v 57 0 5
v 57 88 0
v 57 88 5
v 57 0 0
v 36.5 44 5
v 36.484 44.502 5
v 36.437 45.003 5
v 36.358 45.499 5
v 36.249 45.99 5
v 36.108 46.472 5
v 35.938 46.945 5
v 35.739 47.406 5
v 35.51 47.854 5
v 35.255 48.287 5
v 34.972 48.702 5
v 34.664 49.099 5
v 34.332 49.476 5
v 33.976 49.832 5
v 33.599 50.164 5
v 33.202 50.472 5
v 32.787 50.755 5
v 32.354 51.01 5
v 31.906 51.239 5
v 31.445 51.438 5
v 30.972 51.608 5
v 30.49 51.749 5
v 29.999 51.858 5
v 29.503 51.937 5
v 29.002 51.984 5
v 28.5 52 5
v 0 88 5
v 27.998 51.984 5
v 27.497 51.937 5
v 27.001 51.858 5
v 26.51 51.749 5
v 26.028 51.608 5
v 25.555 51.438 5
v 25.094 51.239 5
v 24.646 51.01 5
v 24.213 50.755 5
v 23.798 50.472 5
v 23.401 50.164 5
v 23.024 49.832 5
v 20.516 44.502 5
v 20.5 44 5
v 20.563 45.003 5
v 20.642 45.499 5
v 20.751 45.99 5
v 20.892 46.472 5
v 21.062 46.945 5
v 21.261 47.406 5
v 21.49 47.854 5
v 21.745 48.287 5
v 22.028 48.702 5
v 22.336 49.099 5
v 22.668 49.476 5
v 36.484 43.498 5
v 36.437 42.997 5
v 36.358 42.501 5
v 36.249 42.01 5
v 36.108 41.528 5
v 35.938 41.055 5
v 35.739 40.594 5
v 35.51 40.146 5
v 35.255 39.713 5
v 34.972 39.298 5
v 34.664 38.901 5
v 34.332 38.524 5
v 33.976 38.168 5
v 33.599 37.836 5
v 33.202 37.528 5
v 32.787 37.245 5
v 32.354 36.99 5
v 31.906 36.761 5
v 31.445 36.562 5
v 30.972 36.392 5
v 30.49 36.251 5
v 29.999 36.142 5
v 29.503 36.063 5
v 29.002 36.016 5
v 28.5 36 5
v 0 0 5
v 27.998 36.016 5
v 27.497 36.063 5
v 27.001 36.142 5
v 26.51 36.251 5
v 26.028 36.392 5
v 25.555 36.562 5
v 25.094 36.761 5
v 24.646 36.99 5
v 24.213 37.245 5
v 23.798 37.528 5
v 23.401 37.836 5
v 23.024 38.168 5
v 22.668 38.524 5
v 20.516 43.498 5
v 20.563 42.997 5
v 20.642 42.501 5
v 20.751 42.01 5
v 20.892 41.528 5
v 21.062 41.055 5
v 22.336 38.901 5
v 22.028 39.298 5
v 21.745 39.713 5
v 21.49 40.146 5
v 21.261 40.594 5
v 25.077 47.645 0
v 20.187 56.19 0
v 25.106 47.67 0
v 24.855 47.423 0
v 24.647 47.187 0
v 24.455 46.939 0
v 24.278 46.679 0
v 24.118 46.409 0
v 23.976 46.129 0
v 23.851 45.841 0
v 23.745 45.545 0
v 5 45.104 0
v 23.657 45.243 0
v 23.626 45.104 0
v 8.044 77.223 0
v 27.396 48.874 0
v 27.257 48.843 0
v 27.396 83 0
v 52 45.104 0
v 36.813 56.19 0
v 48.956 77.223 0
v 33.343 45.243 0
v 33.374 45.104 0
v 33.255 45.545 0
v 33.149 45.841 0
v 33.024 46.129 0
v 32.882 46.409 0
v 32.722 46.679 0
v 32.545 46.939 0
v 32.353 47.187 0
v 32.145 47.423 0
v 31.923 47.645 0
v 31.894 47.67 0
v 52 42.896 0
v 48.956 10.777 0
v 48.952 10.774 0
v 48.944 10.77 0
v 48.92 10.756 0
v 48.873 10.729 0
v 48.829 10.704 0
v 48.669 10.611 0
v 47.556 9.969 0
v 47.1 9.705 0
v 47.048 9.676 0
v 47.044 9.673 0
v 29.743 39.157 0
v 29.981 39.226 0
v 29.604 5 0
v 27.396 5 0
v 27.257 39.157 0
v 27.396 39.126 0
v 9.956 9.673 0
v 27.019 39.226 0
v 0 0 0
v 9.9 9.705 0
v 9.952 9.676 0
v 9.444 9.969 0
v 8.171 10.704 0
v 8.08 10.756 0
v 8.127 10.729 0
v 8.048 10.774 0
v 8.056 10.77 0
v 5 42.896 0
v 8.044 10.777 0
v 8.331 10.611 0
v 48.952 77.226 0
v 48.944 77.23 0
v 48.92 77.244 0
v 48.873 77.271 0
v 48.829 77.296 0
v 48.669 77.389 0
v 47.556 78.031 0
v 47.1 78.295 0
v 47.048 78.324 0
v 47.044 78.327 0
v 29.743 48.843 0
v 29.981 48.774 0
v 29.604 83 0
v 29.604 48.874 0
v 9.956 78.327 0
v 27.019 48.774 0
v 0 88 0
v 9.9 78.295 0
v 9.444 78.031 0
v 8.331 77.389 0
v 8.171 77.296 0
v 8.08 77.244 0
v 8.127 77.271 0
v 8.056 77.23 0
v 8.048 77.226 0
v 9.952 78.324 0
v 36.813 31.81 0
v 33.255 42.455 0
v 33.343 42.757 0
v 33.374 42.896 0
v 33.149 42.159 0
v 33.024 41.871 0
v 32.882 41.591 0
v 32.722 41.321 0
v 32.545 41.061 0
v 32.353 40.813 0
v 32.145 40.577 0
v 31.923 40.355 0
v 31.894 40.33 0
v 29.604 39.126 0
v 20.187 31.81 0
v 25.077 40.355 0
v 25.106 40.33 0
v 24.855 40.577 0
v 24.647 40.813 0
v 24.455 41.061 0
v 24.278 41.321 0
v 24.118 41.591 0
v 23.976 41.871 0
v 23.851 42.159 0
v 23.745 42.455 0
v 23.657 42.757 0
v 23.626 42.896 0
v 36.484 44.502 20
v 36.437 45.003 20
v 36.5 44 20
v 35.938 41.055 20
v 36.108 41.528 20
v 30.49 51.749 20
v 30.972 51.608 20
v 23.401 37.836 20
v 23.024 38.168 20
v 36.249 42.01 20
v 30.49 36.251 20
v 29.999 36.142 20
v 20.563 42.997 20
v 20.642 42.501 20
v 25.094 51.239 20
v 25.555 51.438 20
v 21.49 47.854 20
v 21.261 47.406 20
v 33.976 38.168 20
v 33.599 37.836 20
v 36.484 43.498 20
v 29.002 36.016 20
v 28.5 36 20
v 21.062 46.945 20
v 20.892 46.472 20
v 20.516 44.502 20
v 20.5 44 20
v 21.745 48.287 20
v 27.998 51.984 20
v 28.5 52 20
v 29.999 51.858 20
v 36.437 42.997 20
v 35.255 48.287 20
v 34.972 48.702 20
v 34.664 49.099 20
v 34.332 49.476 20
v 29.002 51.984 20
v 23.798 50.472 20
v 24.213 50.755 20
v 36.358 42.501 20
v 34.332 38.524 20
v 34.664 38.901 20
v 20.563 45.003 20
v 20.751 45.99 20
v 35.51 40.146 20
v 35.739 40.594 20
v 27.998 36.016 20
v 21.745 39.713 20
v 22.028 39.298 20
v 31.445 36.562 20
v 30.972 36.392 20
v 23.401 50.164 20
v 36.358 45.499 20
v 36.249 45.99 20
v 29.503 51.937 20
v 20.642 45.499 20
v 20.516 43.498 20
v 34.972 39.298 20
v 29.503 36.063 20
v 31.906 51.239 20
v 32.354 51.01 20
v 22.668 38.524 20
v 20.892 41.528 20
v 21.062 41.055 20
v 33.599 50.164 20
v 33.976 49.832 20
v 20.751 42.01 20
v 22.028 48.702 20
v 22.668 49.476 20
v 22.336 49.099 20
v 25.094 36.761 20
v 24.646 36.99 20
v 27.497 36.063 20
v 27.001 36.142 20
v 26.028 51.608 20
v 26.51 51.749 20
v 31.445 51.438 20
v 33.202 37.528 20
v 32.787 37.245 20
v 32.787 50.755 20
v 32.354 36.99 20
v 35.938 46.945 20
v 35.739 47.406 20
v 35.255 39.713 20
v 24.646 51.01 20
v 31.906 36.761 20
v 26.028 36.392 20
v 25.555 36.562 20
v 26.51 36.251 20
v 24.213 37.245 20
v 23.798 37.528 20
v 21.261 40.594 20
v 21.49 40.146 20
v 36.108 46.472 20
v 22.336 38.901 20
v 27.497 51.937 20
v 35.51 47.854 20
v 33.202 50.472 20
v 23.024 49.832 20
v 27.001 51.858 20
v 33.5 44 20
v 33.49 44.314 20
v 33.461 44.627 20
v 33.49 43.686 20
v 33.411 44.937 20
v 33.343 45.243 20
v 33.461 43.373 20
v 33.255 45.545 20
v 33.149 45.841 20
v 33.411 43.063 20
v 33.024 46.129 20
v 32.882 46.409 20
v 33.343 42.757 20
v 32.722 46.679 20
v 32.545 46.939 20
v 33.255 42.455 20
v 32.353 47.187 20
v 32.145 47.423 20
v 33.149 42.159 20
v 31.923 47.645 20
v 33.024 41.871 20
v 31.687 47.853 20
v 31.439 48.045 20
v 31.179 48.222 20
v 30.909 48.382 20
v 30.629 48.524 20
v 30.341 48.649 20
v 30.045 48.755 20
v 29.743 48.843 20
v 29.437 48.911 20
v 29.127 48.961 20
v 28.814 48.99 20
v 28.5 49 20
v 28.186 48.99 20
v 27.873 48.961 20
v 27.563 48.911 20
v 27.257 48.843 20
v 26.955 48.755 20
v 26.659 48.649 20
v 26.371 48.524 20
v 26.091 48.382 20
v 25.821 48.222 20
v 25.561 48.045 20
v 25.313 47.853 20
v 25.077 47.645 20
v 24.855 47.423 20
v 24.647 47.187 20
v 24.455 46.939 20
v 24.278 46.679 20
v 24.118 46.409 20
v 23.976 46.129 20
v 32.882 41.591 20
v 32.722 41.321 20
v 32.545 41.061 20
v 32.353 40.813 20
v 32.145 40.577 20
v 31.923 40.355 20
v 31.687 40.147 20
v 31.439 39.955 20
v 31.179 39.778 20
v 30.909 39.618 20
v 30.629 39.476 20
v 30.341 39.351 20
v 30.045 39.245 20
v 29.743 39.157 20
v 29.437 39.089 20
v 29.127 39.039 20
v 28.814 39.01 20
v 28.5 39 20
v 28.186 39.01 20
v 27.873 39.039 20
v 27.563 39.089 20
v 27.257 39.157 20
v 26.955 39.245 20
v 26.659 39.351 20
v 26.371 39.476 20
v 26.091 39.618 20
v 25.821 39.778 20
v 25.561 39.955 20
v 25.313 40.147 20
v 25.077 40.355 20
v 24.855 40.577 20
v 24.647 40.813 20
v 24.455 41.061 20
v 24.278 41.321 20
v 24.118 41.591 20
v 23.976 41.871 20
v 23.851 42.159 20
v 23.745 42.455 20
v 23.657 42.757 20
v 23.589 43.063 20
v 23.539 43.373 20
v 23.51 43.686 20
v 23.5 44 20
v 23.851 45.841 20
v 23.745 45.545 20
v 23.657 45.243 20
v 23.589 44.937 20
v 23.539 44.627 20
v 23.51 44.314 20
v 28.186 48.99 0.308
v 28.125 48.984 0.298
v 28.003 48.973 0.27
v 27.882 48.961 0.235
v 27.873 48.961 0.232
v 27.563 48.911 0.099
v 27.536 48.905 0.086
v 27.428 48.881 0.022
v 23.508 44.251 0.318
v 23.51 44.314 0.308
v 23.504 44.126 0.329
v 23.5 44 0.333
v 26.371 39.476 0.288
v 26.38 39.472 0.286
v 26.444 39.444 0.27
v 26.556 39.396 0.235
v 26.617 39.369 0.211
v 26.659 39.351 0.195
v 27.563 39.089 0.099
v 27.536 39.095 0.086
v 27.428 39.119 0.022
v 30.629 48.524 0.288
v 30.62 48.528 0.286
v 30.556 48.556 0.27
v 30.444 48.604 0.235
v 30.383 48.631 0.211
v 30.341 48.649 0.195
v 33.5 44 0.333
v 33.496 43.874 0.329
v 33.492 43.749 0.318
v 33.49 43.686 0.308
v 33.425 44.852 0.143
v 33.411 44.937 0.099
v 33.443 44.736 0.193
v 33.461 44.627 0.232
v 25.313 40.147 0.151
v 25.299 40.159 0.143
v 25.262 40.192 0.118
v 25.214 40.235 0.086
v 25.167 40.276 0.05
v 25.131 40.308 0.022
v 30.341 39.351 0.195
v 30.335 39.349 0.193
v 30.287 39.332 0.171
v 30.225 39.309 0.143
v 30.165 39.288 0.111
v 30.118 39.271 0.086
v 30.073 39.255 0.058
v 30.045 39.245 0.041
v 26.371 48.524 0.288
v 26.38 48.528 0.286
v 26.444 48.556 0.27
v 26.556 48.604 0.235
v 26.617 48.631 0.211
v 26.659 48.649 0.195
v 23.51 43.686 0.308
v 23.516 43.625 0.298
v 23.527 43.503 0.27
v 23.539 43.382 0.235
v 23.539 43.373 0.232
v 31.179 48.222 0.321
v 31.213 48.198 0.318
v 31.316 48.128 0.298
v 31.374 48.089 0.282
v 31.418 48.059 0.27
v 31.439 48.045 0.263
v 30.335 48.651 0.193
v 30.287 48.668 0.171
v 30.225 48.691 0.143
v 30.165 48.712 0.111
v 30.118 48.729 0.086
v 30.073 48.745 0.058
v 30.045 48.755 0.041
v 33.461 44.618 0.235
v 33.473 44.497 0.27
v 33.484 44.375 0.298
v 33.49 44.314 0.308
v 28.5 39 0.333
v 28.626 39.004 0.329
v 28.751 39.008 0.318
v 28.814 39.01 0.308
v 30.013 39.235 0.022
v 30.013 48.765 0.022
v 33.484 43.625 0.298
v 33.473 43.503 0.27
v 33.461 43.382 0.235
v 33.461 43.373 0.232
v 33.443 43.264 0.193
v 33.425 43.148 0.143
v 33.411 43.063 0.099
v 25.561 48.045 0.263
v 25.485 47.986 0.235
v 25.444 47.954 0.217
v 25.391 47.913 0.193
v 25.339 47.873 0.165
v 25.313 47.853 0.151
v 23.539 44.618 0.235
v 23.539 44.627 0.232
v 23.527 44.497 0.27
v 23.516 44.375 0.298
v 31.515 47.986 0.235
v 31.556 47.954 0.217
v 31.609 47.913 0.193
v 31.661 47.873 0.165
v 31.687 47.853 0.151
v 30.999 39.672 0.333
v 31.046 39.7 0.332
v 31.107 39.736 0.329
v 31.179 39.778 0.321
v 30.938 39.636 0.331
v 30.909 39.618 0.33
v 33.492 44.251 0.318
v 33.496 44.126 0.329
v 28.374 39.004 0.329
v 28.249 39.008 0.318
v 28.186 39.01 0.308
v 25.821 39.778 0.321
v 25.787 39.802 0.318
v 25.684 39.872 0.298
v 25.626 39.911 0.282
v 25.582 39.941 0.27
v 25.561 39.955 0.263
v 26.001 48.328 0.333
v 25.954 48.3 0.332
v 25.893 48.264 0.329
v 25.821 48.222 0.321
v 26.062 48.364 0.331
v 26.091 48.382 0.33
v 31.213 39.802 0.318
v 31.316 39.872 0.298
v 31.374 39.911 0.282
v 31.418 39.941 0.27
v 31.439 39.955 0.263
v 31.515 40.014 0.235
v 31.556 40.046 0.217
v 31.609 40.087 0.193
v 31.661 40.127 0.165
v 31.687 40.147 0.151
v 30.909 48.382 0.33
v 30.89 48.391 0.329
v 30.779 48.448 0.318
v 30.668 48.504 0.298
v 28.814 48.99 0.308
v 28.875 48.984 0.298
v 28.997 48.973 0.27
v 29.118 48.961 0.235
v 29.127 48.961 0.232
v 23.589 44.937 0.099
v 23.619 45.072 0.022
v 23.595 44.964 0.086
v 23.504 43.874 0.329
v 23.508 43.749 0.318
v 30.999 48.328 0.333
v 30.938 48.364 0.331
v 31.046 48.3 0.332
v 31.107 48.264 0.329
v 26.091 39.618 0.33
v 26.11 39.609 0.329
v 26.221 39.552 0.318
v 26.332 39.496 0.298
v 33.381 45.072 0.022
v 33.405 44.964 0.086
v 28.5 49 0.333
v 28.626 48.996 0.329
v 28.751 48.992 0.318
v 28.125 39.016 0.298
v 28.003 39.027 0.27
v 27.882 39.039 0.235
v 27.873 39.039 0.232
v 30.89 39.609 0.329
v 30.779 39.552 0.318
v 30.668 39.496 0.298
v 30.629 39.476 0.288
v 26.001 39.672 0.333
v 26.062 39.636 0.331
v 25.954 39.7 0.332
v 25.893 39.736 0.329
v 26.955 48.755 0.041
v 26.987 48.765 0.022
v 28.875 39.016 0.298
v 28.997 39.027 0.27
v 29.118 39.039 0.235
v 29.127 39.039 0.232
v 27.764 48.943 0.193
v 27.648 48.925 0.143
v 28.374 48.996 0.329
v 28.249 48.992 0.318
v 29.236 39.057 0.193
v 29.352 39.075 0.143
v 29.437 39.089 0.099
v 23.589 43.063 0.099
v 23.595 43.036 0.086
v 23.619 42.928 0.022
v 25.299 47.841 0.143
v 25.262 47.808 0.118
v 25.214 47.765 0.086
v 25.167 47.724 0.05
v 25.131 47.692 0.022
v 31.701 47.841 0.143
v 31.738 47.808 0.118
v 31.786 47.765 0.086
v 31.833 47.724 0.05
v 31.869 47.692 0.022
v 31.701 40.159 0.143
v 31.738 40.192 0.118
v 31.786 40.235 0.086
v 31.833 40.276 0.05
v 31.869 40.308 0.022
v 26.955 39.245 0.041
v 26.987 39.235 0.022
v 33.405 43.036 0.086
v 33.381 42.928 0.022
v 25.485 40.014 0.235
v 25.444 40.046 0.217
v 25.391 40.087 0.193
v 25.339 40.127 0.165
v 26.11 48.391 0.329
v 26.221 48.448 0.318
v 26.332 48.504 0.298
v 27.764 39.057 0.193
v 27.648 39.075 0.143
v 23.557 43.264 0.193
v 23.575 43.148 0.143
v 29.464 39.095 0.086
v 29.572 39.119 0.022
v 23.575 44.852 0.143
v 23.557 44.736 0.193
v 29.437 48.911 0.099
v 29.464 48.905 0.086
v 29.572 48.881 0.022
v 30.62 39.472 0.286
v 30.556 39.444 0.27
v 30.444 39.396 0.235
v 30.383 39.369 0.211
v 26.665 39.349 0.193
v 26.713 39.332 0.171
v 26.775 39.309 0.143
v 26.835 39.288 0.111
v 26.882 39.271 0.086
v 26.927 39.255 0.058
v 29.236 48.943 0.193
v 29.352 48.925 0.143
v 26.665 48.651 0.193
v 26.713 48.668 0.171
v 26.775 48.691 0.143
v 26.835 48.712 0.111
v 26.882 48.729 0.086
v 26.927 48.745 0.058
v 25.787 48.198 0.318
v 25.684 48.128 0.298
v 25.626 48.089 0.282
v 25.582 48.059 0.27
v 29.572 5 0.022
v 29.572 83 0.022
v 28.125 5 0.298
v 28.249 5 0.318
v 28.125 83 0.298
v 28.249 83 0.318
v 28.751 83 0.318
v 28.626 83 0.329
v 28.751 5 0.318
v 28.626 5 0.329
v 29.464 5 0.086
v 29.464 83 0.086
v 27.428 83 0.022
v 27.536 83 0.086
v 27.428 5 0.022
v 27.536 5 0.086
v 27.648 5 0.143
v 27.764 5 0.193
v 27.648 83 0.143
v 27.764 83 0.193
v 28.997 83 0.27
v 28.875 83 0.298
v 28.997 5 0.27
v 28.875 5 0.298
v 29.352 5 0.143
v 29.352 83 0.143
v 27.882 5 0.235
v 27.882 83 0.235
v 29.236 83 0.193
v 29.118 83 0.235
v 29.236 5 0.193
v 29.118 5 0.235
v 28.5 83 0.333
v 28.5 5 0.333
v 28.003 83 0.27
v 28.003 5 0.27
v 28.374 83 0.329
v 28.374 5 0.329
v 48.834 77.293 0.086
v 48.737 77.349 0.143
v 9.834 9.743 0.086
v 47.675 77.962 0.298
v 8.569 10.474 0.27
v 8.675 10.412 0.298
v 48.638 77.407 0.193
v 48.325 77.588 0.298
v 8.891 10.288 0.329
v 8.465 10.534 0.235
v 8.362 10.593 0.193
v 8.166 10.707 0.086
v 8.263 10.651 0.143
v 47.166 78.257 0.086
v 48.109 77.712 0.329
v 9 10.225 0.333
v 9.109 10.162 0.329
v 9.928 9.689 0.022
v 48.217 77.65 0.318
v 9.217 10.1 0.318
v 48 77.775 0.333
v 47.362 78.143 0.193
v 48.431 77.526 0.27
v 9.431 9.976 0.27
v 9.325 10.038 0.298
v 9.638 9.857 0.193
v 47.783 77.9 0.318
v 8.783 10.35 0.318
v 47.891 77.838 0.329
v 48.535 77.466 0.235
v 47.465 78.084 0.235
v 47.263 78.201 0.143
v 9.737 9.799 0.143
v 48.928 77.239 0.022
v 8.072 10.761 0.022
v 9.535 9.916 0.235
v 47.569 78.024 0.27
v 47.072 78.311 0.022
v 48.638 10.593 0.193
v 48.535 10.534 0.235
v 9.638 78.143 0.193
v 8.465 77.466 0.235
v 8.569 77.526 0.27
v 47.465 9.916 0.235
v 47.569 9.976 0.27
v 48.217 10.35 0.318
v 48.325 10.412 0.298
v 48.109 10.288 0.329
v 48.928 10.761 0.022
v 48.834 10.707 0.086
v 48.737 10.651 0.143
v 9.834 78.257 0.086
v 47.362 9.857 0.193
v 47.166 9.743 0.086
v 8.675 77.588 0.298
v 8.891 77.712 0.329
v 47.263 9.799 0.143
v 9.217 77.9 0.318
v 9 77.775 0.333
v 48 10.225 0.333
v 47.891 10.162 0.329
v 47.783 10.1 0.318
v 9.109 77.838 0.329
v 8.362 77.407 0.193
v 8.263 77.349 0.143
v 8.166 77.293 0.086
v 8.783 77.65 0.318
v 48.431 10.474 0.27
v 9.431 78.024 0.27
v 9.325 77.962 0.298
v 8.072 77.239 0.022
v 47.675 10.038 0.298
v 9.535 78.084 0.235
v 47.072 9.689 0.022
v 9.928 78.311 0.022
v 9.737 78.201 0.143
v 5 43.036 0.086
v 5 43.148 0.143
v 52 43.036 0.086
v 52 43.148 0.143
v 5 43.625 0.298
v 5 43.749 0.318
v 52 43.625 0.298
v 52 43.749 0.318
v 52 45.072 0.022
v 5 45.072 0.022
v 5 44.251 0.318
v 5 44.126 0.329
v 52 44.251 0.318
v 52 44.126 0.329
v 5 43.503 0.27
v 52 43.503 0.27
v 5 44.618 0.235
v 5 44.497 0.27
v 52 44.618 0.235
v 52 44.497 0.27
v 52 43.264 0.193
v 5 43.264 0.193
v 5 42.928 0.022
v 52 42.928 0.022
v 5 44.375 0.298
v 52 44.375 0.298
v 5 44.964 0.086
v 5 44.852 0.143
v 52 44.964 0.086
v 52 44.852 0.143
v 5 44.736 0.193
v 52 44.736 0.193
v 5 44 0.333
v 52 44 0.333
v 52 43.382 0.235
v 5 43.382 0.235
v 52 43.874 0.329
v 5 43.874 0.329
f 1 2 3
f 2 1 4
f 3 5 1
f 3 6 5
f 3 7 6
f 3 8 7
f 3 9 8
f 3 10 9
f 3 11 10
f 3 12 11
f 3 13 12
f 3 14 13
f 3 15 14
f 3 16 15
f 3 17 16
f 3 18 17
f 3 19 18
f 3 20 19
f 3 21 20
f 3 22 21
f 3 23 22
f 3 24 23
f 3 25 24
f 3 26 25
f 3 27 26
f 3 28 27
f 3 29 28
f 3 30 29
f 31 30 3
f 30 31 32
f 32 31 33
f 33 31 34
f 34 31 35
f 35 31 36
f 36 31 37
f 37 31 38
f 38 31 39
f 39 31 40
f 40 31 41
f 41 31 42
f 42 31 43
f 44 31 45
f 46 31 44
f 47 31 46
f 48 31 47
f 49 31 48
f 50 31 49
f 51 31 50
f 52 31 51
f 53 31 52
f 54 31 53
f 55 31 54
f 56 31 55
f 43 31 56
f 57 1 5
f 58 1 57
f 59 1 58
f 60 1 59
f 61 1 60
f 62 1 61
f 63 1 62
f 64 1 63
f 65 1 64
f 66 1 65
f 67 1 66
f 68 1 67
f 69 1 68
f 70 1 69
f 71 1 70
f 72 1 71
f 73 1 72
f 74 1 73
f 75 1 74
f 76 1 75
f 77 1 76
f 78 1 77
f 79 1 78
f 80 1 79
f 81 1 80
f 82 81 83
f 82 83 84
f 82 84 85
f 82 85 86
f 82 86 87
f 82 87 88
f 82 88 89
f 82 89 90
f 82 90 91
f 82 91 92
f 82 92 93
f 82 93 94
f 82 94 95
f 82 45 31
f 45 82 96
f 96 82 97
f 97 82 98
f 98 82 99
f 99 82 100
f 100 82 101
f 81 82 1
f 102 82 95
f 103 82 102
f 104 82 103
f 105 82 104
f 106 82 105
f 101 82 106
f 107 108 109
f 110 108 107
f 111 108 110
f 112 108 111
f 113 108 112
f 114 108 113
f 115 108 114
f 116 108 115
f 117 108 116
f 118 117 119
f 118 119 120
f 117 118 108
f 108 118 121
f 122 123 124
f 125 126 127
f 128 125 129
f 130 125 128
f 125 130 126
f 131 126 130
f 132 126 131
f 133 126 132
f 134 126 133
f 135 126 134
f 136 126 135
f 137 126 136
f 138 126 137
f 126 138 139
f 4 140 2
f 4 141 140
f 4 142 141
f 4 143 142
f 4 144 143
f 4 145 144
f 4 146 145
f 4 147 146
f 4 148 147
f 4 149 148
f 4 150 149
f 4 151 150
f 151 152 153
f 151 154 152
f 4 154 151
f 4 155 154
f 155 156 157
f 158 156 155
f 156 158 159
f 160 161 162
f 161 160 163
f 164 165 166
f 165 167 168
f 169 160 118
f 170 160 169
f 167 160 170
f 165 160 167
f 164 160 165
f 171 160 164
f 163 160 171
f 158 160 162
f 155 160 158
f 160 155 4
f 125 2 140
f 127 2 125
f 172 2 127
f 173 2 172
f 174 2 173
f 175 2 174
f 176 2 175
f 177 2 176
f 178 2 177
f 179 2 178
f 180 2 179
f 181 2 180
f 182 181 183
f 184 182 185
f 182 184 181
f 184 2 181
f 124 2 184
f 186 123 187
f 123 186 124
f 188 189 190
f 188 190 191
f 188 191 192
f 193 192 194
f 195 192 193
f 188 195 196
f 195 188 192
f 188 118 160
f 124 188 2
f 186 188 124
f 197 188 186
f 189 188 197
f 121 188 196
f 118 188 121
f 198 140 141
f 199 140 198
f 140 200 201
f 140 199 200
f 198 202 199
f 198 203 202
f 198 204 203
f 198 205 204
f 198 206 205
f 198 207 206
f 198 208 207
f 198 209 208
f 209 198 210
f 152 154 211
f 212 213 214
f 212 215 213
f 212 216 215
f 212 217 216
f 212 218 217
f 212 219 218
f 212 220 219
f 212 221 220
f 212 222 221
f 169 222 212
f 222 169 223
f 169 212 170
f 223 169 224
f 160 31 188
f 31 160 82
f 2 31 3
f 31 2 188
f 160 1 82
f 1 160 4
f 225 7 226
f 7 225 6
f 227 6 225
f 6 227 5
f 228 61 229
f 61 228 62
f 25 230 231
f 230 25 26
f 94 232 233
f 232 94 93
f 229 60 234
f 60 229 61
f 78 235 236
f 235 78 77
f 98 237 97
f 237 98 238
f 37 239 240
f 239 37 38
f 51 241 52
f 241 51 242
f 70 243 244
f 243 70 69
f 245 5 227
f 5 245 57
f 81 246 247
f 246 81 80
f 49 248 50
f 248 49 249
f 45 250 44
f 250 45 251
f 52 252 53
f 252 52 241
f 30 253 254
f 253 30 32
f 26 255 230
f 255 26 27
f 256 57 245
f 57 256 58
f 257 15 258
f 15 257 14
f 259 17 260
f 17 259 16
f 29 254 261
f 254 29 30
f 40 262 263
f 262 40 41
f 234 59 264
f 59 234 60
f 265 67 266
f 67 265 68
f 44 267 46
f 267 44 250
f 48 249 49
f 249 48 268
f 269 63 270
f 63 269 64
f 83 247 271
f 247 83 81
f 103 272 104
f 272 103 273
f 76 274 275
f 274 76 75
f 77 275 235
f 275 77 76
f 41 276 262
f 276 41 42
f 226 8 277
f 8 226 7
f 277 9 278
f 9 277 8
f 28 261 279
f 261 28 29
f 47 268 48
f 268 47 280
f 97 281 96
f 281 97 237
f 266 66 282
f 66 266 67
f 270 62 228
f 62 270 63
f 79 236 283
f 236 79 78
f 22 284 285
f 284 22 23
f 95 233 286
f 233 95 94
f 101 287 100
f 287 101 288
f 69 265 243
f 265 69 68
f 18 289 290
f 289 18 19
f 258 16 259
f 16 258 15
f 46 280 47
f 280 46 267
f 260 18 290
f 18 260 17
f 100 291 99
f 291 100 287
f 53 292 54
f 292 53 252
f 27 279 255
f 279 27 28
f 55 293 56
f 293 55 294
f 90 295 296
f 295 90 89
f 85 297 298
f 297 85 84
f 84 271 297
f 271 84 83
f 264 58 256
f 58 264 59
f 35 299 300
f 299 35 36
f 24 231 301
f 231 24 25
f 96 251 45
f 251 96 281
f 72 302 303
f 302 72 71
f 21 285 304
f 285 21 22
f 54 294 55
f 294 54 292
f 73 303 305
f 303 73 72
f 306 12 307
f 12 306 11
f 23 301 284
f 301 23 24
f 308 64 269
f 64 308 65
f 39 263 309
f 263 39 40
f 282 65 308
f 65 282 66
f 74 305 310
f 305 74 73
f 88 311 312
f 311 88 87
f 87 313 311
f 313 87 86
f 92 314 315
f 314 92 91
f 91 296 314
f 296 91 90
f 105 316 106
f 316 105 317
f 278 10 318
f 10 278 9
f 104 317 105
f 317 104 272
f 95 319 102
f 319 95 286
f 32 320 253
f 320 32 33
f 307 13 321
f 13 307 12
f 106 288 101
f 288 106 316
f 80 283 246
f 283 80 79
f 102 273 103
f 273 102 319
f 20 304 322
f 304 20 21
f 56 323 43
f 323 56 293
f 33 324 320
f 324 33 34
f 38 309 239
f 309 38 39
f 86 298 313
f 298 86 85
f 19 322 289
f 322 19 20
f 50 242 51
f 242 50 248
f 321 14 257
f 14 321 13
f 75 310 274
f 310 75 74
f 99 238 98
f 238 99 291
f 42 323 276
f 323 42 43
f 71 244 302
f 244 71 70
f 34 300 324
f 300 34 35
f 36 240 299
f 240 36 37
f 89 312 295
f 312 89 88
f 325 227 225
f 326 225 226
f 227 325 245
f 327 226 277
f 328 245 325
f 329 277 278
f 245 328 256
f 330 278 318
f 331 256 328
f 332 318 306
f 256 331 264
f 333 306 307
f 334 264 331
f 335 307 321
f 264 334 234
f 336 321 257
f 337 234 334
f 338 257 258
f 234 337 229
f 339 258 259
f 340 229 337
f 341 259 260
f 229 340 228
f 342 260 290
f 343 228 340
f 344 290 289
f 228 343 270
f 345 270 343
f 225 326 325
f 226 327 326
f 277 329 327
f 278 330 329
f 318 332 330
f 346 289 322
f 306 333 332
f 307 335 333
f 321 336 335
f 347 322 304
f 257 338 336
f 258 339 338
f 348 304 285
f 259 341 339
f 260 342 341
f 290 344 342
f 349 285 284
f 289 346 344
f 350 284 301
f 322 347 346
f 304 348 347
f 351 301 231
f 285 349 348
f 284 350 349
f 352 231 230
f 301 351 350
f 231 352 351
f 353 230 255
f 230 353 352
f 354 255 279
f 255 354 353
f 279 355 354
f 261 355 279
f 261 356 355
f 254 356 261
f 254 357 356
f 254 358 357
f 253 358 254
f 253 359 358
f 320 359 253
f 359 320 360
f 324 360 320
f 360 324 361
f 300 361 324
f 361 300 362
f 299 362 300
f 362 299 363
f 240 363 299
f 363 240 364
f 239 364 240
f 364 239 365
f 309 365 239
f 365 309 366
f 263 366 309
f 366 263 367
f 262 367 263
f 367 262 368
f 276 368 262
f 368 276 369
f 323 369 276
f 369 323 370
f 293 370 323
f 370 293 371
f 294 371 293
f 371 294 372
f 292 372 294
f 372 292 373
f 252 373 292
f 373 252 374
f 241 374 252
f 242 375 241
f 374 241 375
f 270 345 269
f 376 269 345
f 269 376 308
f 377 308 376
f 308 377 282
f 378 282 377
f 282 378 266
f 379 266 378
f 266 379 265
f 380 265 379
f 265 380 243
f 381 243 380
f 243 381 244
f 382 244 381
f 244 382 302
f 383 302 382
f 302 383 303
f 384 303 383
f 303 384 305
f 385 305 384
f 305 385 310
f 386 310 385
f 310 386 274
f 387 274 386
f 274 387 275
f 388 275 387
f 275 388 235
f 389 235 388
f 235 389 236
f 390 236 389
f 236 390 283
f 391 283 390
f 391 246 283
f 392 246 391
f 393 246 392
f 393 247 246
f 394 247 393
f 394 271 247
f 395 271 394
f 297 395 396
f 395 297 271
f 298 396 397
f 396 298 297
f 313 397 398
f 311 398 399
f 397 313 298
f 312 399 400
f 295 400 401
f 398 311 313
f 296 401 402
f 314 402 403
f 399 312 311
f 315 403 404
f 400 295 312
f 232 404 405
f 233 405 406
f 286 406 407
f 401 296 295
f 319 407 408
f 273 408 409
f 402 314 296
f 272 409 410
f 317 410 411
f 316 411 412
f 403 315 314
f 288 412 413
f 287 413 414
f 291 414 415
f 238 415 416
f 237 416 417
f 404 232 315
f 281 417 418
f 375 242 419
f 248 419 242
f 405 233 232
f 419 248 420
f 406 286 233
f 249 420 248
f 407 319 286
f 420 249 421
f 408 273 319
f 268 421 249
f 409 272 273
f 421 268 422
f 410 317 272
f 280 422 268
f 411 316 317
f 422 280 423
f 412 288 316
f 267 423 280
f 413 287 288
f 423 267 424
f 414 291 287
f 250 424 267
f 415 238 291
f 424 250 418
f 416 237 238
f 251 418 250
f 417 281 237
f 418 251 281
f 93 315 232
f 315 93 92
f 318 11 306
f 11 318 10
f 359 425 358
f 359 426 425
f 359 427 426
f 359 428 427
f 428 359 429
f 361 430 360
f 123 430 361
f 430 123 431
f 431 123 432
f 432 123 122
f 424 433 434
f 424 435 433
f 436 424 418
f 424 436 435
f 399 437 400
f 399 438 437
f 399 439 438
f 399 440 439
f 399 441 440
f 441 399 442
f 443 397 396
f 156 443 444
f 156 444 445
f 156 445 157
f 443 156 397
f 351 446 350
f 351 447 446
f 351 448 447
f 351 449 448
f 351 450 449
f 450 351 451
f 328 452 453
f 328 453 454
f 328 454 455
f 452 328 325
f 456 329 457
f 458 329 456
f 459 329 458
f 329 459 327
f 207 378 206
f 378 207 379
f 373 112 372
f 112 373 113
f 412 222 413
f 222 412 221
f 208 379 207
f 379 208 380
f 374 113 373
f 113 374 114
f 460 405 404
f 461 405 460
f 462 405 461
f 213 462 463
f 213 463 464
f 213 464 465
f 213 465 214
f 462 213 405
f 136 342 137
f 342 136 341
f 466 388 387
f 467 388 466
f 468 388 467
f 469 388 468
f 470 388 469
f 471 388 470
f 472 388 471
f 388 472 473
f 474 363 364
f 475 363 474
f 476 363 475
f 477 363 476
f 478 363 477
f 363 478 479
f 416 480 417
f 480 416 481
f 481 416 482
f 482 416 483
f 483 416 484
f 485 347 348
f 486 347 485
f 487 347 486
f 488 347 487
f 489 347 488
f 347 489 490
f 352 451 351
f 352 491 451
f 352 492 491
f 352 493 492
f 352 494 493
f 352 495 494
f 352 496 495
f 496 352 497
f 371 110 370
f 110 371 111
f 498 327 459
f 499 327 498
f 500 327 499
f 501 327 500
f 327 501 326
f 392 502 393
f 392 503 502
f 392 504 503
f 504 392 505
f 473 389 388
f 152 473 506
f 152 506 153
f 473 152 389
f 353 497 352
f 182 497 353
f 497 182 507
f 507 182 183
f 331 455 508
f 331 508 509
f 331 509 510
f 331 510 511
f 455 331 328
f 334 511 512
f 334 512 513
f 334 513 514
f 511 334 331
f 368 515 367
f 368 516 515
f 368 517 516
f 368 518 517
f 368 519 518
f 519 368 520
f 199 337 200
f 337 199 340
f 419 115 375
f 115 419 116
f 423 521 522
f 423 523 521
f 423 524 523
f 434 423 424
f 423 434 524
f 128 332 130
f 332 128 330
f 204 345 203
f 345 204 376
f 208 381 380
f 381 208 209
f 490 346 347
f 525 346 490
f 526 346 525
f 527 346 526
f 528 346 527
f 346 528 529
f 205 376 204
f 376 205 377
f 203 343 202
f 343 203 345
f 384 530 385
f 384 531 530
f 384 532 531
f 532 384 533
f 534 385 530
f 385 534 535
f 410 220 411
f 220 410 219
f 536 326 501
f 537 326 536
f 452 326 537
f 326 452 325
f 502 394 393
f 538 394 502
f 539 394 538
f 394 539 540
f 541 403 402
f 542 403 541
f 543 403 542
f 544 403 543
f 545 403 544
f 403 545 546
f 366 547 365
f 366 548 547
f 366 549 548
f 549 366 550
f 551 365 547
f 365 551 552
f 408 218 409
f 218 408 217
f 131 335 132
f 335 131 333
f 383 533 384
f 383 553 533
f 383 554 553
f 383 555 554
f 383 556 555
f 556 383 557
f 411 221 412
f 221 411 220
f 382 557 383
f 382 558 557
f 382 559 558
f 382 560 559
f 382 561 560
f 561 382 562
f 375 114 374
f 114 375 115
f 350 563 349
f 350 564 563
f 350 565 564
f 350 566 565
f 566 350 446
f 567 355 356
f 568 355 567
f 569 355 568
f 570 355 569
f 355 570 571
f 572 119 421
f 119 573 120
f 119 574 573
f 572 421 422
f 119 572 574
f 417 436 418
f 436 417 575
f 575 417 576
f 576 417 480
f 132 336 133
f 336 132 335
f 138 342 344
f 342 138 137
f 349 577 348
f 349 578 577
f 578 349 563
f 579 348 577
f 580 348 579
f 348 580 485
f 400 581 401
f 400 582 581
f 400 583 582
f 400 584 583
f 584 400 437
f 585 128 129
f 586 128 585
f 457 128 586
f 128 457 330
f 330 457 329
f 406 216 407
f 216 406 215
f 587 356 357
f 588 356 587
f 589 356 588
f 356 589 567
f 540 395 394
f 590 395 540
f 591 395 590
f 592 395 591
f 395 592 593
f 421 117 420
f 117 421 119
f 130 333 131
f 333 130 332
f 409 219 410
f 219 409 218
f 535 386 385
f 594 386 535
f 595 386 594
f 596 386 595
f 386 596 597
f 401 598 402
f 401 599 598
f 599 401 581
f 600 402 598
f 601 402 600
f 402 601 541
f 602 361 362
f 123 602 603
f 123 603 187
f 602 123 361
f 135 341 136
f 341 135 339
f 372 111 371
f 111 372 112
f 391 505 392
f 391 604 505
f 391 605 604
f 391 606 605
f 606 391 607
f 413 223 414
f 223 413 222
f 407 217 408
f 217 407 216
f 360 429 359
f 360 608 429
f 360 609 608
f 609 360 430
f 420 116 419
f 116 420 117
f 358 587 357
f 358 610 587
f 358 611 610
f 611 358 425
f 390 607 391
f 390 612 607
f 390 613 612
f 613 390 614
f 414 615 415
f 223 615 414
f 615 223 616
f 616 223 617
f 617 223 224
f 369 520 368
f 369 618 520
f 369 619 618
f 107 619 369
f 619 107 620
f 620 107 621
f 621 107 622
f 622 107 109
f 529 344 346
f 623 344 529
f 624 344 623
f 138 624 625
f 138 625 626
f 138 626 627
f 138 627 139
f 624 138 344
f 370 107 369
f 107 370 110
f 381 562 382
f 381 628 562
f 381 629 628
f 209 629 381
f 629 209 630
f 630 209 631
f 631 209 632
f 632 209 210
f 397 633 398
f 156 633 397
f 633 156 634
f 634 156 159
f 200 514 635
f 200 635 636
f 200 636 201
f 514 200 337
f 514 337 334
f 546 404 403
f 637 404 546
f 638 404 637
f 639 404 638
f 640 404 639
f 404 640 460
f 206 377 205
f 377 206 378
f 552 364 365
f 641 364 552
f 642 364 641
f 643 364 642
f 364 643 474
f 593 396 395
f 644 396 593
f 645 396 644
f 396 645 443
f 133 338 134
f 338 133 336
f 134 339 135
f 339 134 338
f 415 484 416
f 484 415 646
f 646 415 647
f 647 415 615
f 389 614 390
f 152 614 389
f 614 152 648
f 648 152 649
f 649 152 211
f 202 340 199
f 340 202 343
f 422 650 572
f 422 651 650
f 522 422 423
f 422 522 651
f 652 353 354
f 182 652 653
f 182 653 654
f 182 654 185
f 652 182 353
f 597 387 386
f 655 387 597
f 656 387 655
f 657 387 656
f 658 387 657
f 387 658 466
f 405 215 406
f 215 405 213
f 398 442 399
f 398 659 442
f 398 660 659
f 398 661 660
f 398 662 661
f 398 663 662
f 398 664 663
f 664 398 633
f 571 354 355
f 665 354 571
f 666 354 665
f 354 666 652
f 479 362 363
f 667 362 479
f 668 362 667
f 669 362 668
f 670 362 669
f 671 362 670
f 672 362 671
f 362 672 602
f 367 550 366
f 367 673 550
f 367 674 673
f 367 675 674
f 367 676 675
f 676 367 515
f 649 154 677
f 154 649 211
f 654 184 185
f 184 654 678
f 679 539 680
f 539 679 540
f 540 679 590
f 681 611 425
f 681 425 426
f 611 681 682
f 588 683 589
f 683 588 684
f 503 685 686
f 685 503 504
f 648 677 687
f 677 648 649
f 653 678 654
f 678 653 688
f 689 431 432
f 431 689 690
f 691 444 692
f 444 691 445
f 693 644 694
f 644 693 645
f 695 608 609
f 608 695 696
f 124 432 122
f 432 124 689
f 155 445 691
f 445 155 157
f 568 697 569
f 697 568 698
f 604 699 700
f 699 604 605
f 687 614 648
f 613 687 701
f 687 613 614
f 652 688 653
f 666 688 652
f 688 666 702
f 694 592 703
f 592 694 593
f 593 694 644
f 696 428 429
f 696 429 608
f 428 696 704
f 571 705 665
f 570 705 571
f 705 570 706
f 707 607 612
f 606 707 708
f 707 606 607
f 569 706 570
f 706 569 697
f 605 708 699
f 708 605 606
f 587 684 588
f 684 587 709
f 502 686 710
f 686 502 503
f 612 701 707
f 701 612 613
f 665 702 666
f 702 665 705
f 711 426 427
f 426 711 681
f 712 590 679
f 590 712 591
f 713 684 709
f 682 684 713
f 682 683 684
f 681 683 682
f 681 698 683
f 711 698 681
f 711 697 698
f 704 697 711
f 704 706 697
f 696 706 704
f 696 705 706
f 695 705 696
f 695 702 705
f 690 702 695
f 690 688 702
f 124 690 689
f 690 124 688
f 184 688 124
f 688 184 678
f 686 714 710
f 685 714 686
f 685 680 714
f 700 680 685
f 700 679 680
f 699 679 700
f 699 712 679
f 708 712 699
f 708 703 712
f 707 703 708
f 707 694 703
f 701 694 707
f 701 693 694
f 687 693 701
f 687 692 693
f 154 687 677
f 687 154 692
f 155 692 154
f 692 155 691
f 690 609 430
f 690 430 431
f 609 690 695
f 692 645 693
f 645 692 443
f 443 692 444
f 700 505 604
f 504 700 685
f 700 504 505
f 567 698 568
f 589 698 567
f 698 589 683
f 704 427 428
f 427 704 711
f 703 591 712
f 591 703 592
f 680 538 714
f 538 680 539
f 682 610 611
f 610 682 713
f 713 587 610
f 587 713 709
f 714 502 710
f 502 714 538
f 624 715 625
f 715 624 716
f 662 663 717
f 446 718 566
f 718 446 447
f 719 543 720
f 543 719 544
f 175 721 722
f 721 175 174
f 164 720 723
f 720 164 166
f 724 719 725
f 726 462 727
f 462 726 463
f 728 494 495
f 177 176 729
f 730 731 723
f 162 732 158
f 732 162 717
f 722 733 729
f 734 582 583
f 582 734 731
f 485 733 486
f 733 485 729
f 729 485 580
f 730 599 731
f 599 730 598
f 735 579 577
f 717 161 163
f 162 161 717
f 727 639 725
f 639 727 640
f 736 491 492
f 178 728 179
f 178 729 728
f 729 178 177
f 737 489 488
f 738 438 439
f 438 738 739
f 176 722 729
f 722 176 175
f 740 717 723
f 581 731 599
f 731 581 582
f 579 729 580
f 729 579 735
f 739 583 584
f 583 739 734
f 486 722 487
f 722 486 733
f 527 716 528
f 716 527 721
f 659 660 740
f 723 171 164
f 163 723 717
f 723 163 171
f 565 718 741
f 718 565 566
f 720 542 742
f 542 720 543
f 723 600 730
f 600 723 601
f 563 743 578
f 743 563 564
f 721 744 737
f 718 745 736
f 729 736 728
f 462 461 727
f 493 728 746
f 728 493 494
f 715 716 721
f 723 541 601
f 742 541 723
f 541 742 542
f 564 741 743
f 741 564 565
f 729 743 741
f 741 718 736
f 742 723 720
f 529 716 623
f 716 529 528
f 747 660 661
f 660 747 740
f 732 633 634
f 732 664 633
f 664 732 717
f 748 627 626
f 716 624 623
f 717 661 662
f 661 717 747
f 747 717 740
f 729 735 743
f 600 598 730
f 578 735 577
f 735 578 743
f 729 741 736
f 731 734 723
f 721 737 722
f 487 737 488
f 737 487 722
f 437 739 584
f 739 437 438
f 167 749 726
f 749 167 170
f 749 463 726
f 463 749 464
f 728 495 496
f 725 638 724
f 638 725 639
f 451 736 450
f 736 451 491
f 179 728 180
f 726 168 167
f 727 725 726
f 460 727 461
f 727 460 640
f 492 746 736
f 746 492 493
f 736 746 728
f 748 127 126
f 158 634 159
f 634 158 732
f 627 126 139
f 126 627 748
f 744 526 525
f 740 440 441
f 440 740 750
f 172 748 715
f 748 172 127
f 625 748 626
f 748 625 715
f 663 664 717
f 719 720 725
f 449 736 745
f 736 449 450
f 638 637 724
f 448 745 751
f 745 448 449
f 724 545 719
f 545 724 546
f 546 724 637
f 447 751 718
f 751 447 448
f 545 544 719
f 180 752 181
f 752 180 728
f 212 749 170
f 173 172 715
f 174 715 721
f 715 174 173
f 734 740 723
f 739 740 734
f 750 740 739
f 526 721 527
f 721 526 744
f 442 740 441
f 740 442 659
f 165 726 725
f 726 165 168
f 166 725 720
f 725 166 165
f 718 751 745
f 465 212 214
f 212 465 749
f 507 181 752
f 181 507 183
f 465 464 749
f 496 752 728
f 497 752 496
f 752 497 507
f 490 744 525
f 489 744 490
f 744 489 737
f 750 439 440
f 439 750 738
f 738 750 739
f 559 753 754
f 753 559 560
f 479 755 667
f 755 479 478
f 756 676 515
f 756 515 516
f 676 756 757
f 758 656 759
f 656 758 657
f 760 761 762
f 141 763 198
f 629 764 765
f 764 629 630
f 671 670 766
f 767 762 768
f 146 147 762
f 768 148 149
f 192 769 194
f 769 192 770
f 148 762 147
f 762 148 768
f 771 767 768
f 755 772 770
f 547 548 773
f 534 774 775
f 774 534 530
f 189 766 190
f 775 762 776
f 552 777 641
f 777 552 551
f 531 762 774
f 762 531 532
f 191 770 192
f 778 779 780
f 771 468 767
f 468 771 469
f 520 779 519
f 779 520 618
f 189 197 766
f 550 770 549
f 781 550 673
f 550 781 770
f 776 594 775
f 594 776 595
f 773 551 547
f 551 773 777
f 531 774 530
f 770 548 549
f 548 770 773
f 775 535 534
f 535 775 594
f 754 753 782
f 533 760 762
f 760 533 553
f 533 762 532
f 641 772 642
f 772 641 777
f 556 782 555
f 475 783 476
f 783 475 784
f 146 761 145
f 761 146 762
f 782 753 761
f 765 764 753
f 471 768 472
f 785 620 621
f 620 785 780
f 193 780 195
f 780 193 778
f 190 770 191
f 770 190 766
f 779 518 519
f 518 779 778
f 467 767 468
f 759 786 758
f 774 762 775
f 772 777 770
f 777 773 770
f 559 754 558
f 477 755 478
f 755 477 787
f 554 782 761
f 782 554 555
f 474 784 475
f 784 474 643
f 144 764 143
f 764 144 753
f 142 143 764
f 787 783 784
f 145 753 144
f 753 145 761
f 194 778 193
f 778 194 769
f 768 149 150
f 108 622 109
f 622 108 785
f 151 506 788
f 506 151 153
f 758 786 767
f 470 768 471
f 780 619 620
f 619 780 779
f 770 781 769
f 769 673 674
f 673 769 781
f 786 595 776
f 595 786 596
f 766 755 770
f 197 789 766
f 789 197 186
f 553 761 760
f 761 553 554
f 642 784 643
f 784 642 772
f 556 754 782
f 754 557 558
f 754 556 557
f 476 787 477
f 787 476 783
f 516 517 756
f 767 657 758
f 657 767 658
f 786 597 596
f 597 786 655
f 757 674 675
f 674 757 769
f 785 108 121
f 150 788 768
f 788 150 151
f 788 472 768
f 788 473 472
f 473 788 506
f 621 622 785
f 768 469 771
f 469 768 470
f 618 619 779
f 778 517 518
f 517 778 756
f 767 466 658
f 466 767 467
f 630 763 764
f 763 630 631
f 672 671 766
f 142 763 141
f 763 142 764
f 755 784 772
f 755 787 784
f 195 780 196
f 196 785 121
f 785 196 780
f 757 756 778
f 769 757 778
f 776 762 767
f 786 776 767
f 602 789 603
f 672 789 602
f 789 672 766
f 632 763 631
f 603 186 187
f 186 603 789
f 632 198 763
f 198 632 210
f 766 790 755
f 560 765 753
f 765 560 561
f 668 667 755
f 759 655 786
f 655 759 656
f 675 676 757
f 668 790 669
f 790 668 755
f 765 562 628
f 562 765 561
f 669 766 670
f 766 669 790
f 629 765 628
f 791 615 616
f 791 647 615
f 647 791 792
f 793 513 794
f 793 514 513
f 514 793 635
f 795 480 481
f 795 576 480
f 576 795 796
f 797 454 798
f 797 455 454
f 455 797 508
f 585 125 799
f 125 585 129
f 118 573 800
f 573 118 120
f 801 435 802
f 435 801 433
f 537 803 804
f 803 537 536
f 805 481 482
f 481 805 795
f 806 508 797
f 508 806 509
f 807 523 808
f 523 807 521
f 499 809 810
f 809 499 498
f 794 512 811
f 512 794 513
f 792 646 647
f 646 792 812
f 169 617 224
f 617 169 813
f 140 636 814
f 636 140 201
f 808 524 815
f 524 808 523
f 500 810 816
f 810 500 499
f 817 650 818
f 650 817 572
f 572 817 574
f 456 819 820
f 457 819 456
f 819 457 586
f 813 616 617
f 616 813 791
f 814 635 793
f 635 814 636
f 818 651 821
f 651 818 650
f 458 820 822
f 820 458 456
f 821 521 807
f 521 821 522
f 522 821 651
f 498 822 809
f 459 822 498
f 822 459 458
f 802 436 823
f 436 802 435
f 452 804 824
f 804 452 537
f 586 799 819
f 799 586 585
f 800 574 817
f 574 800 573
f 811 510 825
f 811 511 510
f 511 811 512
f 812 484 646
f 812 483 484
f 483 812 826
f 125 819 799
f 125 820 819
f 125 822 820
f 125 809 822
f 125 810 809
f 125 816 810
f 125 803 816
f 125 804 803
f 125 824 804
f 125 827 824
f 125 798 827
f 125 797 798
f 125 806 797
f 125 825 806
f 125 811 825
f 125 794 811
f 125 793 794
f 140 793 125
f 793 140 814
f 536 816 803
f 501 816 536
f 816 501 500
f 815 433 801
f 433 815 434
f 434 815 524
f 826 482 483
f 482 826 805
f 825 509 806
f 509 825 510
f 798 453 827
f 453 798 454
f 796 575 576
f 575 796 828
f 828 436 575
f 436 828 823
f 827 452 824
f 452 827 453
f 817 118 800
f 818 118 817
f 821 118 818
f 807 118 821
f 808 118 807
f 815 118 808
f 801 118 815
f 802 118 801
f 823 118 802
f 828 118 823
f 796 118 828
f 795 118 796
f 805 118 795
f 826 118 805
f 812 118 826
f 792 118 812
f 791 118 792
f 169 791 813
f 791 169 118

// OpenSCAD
width = 57; //53
length = 88; //84
height = 5;
channel_radius = 2;
channel_length = length-10;
short_channel_length = width - 10;
hole_inner_radius = 5;
hole_outer_radius = 8;
hole_height = height + 15;

difference() {
union() {  
  cube([width, length,height]);
    translate([width / 2, length / 2, 0])
      linear_extrude(hole_height) circle(hole_outer_radius, $fn=100);
 }
 translate([width / 2, length / 2, 0])
   translate([0,0, -1])
     linear_extrude(hole_height +2) circle(hole_inner_radius, $fn=100);
 
 translate([width/2,length - ((length - channel_length) / 2),-channel_radius / 1.2])
   rotate([90,0,0])
     linear_extrude(channel_length) circle(channel_radius, $fn=100);

 translate([width/2,length / 2,-channel_radius / 1.2])
   rotate([90,0,0])
     translate([0,0,-channel_length / 2])
     linear_extrude(channel_length) circle(channel_radius, $fn=100);
 translate([width/2,length / 2,-channel_radius / 1.2])
   rotate([90,0,-30])
     translate([0,0,-channel_length / 2])
     linear_extrude(channel_length) circle(channel_radius, $fn=100);
 translate([width/2,length / 2,-channel_radius / 1.2])
   rotate([90,0,30])
     translate([0,0,-channel_length / 2])
     linear_extrude(channel_length) circle(channel_radius, $fn=100);

 translate([width/2,length / 2,-channel_radius / 1.2])
   rotate([90,0,90])
     translate([0,0,- short_channel_length / 2])
     linear_extrude(short_channel_length) circle(channel_radius, $fn=100);

}
